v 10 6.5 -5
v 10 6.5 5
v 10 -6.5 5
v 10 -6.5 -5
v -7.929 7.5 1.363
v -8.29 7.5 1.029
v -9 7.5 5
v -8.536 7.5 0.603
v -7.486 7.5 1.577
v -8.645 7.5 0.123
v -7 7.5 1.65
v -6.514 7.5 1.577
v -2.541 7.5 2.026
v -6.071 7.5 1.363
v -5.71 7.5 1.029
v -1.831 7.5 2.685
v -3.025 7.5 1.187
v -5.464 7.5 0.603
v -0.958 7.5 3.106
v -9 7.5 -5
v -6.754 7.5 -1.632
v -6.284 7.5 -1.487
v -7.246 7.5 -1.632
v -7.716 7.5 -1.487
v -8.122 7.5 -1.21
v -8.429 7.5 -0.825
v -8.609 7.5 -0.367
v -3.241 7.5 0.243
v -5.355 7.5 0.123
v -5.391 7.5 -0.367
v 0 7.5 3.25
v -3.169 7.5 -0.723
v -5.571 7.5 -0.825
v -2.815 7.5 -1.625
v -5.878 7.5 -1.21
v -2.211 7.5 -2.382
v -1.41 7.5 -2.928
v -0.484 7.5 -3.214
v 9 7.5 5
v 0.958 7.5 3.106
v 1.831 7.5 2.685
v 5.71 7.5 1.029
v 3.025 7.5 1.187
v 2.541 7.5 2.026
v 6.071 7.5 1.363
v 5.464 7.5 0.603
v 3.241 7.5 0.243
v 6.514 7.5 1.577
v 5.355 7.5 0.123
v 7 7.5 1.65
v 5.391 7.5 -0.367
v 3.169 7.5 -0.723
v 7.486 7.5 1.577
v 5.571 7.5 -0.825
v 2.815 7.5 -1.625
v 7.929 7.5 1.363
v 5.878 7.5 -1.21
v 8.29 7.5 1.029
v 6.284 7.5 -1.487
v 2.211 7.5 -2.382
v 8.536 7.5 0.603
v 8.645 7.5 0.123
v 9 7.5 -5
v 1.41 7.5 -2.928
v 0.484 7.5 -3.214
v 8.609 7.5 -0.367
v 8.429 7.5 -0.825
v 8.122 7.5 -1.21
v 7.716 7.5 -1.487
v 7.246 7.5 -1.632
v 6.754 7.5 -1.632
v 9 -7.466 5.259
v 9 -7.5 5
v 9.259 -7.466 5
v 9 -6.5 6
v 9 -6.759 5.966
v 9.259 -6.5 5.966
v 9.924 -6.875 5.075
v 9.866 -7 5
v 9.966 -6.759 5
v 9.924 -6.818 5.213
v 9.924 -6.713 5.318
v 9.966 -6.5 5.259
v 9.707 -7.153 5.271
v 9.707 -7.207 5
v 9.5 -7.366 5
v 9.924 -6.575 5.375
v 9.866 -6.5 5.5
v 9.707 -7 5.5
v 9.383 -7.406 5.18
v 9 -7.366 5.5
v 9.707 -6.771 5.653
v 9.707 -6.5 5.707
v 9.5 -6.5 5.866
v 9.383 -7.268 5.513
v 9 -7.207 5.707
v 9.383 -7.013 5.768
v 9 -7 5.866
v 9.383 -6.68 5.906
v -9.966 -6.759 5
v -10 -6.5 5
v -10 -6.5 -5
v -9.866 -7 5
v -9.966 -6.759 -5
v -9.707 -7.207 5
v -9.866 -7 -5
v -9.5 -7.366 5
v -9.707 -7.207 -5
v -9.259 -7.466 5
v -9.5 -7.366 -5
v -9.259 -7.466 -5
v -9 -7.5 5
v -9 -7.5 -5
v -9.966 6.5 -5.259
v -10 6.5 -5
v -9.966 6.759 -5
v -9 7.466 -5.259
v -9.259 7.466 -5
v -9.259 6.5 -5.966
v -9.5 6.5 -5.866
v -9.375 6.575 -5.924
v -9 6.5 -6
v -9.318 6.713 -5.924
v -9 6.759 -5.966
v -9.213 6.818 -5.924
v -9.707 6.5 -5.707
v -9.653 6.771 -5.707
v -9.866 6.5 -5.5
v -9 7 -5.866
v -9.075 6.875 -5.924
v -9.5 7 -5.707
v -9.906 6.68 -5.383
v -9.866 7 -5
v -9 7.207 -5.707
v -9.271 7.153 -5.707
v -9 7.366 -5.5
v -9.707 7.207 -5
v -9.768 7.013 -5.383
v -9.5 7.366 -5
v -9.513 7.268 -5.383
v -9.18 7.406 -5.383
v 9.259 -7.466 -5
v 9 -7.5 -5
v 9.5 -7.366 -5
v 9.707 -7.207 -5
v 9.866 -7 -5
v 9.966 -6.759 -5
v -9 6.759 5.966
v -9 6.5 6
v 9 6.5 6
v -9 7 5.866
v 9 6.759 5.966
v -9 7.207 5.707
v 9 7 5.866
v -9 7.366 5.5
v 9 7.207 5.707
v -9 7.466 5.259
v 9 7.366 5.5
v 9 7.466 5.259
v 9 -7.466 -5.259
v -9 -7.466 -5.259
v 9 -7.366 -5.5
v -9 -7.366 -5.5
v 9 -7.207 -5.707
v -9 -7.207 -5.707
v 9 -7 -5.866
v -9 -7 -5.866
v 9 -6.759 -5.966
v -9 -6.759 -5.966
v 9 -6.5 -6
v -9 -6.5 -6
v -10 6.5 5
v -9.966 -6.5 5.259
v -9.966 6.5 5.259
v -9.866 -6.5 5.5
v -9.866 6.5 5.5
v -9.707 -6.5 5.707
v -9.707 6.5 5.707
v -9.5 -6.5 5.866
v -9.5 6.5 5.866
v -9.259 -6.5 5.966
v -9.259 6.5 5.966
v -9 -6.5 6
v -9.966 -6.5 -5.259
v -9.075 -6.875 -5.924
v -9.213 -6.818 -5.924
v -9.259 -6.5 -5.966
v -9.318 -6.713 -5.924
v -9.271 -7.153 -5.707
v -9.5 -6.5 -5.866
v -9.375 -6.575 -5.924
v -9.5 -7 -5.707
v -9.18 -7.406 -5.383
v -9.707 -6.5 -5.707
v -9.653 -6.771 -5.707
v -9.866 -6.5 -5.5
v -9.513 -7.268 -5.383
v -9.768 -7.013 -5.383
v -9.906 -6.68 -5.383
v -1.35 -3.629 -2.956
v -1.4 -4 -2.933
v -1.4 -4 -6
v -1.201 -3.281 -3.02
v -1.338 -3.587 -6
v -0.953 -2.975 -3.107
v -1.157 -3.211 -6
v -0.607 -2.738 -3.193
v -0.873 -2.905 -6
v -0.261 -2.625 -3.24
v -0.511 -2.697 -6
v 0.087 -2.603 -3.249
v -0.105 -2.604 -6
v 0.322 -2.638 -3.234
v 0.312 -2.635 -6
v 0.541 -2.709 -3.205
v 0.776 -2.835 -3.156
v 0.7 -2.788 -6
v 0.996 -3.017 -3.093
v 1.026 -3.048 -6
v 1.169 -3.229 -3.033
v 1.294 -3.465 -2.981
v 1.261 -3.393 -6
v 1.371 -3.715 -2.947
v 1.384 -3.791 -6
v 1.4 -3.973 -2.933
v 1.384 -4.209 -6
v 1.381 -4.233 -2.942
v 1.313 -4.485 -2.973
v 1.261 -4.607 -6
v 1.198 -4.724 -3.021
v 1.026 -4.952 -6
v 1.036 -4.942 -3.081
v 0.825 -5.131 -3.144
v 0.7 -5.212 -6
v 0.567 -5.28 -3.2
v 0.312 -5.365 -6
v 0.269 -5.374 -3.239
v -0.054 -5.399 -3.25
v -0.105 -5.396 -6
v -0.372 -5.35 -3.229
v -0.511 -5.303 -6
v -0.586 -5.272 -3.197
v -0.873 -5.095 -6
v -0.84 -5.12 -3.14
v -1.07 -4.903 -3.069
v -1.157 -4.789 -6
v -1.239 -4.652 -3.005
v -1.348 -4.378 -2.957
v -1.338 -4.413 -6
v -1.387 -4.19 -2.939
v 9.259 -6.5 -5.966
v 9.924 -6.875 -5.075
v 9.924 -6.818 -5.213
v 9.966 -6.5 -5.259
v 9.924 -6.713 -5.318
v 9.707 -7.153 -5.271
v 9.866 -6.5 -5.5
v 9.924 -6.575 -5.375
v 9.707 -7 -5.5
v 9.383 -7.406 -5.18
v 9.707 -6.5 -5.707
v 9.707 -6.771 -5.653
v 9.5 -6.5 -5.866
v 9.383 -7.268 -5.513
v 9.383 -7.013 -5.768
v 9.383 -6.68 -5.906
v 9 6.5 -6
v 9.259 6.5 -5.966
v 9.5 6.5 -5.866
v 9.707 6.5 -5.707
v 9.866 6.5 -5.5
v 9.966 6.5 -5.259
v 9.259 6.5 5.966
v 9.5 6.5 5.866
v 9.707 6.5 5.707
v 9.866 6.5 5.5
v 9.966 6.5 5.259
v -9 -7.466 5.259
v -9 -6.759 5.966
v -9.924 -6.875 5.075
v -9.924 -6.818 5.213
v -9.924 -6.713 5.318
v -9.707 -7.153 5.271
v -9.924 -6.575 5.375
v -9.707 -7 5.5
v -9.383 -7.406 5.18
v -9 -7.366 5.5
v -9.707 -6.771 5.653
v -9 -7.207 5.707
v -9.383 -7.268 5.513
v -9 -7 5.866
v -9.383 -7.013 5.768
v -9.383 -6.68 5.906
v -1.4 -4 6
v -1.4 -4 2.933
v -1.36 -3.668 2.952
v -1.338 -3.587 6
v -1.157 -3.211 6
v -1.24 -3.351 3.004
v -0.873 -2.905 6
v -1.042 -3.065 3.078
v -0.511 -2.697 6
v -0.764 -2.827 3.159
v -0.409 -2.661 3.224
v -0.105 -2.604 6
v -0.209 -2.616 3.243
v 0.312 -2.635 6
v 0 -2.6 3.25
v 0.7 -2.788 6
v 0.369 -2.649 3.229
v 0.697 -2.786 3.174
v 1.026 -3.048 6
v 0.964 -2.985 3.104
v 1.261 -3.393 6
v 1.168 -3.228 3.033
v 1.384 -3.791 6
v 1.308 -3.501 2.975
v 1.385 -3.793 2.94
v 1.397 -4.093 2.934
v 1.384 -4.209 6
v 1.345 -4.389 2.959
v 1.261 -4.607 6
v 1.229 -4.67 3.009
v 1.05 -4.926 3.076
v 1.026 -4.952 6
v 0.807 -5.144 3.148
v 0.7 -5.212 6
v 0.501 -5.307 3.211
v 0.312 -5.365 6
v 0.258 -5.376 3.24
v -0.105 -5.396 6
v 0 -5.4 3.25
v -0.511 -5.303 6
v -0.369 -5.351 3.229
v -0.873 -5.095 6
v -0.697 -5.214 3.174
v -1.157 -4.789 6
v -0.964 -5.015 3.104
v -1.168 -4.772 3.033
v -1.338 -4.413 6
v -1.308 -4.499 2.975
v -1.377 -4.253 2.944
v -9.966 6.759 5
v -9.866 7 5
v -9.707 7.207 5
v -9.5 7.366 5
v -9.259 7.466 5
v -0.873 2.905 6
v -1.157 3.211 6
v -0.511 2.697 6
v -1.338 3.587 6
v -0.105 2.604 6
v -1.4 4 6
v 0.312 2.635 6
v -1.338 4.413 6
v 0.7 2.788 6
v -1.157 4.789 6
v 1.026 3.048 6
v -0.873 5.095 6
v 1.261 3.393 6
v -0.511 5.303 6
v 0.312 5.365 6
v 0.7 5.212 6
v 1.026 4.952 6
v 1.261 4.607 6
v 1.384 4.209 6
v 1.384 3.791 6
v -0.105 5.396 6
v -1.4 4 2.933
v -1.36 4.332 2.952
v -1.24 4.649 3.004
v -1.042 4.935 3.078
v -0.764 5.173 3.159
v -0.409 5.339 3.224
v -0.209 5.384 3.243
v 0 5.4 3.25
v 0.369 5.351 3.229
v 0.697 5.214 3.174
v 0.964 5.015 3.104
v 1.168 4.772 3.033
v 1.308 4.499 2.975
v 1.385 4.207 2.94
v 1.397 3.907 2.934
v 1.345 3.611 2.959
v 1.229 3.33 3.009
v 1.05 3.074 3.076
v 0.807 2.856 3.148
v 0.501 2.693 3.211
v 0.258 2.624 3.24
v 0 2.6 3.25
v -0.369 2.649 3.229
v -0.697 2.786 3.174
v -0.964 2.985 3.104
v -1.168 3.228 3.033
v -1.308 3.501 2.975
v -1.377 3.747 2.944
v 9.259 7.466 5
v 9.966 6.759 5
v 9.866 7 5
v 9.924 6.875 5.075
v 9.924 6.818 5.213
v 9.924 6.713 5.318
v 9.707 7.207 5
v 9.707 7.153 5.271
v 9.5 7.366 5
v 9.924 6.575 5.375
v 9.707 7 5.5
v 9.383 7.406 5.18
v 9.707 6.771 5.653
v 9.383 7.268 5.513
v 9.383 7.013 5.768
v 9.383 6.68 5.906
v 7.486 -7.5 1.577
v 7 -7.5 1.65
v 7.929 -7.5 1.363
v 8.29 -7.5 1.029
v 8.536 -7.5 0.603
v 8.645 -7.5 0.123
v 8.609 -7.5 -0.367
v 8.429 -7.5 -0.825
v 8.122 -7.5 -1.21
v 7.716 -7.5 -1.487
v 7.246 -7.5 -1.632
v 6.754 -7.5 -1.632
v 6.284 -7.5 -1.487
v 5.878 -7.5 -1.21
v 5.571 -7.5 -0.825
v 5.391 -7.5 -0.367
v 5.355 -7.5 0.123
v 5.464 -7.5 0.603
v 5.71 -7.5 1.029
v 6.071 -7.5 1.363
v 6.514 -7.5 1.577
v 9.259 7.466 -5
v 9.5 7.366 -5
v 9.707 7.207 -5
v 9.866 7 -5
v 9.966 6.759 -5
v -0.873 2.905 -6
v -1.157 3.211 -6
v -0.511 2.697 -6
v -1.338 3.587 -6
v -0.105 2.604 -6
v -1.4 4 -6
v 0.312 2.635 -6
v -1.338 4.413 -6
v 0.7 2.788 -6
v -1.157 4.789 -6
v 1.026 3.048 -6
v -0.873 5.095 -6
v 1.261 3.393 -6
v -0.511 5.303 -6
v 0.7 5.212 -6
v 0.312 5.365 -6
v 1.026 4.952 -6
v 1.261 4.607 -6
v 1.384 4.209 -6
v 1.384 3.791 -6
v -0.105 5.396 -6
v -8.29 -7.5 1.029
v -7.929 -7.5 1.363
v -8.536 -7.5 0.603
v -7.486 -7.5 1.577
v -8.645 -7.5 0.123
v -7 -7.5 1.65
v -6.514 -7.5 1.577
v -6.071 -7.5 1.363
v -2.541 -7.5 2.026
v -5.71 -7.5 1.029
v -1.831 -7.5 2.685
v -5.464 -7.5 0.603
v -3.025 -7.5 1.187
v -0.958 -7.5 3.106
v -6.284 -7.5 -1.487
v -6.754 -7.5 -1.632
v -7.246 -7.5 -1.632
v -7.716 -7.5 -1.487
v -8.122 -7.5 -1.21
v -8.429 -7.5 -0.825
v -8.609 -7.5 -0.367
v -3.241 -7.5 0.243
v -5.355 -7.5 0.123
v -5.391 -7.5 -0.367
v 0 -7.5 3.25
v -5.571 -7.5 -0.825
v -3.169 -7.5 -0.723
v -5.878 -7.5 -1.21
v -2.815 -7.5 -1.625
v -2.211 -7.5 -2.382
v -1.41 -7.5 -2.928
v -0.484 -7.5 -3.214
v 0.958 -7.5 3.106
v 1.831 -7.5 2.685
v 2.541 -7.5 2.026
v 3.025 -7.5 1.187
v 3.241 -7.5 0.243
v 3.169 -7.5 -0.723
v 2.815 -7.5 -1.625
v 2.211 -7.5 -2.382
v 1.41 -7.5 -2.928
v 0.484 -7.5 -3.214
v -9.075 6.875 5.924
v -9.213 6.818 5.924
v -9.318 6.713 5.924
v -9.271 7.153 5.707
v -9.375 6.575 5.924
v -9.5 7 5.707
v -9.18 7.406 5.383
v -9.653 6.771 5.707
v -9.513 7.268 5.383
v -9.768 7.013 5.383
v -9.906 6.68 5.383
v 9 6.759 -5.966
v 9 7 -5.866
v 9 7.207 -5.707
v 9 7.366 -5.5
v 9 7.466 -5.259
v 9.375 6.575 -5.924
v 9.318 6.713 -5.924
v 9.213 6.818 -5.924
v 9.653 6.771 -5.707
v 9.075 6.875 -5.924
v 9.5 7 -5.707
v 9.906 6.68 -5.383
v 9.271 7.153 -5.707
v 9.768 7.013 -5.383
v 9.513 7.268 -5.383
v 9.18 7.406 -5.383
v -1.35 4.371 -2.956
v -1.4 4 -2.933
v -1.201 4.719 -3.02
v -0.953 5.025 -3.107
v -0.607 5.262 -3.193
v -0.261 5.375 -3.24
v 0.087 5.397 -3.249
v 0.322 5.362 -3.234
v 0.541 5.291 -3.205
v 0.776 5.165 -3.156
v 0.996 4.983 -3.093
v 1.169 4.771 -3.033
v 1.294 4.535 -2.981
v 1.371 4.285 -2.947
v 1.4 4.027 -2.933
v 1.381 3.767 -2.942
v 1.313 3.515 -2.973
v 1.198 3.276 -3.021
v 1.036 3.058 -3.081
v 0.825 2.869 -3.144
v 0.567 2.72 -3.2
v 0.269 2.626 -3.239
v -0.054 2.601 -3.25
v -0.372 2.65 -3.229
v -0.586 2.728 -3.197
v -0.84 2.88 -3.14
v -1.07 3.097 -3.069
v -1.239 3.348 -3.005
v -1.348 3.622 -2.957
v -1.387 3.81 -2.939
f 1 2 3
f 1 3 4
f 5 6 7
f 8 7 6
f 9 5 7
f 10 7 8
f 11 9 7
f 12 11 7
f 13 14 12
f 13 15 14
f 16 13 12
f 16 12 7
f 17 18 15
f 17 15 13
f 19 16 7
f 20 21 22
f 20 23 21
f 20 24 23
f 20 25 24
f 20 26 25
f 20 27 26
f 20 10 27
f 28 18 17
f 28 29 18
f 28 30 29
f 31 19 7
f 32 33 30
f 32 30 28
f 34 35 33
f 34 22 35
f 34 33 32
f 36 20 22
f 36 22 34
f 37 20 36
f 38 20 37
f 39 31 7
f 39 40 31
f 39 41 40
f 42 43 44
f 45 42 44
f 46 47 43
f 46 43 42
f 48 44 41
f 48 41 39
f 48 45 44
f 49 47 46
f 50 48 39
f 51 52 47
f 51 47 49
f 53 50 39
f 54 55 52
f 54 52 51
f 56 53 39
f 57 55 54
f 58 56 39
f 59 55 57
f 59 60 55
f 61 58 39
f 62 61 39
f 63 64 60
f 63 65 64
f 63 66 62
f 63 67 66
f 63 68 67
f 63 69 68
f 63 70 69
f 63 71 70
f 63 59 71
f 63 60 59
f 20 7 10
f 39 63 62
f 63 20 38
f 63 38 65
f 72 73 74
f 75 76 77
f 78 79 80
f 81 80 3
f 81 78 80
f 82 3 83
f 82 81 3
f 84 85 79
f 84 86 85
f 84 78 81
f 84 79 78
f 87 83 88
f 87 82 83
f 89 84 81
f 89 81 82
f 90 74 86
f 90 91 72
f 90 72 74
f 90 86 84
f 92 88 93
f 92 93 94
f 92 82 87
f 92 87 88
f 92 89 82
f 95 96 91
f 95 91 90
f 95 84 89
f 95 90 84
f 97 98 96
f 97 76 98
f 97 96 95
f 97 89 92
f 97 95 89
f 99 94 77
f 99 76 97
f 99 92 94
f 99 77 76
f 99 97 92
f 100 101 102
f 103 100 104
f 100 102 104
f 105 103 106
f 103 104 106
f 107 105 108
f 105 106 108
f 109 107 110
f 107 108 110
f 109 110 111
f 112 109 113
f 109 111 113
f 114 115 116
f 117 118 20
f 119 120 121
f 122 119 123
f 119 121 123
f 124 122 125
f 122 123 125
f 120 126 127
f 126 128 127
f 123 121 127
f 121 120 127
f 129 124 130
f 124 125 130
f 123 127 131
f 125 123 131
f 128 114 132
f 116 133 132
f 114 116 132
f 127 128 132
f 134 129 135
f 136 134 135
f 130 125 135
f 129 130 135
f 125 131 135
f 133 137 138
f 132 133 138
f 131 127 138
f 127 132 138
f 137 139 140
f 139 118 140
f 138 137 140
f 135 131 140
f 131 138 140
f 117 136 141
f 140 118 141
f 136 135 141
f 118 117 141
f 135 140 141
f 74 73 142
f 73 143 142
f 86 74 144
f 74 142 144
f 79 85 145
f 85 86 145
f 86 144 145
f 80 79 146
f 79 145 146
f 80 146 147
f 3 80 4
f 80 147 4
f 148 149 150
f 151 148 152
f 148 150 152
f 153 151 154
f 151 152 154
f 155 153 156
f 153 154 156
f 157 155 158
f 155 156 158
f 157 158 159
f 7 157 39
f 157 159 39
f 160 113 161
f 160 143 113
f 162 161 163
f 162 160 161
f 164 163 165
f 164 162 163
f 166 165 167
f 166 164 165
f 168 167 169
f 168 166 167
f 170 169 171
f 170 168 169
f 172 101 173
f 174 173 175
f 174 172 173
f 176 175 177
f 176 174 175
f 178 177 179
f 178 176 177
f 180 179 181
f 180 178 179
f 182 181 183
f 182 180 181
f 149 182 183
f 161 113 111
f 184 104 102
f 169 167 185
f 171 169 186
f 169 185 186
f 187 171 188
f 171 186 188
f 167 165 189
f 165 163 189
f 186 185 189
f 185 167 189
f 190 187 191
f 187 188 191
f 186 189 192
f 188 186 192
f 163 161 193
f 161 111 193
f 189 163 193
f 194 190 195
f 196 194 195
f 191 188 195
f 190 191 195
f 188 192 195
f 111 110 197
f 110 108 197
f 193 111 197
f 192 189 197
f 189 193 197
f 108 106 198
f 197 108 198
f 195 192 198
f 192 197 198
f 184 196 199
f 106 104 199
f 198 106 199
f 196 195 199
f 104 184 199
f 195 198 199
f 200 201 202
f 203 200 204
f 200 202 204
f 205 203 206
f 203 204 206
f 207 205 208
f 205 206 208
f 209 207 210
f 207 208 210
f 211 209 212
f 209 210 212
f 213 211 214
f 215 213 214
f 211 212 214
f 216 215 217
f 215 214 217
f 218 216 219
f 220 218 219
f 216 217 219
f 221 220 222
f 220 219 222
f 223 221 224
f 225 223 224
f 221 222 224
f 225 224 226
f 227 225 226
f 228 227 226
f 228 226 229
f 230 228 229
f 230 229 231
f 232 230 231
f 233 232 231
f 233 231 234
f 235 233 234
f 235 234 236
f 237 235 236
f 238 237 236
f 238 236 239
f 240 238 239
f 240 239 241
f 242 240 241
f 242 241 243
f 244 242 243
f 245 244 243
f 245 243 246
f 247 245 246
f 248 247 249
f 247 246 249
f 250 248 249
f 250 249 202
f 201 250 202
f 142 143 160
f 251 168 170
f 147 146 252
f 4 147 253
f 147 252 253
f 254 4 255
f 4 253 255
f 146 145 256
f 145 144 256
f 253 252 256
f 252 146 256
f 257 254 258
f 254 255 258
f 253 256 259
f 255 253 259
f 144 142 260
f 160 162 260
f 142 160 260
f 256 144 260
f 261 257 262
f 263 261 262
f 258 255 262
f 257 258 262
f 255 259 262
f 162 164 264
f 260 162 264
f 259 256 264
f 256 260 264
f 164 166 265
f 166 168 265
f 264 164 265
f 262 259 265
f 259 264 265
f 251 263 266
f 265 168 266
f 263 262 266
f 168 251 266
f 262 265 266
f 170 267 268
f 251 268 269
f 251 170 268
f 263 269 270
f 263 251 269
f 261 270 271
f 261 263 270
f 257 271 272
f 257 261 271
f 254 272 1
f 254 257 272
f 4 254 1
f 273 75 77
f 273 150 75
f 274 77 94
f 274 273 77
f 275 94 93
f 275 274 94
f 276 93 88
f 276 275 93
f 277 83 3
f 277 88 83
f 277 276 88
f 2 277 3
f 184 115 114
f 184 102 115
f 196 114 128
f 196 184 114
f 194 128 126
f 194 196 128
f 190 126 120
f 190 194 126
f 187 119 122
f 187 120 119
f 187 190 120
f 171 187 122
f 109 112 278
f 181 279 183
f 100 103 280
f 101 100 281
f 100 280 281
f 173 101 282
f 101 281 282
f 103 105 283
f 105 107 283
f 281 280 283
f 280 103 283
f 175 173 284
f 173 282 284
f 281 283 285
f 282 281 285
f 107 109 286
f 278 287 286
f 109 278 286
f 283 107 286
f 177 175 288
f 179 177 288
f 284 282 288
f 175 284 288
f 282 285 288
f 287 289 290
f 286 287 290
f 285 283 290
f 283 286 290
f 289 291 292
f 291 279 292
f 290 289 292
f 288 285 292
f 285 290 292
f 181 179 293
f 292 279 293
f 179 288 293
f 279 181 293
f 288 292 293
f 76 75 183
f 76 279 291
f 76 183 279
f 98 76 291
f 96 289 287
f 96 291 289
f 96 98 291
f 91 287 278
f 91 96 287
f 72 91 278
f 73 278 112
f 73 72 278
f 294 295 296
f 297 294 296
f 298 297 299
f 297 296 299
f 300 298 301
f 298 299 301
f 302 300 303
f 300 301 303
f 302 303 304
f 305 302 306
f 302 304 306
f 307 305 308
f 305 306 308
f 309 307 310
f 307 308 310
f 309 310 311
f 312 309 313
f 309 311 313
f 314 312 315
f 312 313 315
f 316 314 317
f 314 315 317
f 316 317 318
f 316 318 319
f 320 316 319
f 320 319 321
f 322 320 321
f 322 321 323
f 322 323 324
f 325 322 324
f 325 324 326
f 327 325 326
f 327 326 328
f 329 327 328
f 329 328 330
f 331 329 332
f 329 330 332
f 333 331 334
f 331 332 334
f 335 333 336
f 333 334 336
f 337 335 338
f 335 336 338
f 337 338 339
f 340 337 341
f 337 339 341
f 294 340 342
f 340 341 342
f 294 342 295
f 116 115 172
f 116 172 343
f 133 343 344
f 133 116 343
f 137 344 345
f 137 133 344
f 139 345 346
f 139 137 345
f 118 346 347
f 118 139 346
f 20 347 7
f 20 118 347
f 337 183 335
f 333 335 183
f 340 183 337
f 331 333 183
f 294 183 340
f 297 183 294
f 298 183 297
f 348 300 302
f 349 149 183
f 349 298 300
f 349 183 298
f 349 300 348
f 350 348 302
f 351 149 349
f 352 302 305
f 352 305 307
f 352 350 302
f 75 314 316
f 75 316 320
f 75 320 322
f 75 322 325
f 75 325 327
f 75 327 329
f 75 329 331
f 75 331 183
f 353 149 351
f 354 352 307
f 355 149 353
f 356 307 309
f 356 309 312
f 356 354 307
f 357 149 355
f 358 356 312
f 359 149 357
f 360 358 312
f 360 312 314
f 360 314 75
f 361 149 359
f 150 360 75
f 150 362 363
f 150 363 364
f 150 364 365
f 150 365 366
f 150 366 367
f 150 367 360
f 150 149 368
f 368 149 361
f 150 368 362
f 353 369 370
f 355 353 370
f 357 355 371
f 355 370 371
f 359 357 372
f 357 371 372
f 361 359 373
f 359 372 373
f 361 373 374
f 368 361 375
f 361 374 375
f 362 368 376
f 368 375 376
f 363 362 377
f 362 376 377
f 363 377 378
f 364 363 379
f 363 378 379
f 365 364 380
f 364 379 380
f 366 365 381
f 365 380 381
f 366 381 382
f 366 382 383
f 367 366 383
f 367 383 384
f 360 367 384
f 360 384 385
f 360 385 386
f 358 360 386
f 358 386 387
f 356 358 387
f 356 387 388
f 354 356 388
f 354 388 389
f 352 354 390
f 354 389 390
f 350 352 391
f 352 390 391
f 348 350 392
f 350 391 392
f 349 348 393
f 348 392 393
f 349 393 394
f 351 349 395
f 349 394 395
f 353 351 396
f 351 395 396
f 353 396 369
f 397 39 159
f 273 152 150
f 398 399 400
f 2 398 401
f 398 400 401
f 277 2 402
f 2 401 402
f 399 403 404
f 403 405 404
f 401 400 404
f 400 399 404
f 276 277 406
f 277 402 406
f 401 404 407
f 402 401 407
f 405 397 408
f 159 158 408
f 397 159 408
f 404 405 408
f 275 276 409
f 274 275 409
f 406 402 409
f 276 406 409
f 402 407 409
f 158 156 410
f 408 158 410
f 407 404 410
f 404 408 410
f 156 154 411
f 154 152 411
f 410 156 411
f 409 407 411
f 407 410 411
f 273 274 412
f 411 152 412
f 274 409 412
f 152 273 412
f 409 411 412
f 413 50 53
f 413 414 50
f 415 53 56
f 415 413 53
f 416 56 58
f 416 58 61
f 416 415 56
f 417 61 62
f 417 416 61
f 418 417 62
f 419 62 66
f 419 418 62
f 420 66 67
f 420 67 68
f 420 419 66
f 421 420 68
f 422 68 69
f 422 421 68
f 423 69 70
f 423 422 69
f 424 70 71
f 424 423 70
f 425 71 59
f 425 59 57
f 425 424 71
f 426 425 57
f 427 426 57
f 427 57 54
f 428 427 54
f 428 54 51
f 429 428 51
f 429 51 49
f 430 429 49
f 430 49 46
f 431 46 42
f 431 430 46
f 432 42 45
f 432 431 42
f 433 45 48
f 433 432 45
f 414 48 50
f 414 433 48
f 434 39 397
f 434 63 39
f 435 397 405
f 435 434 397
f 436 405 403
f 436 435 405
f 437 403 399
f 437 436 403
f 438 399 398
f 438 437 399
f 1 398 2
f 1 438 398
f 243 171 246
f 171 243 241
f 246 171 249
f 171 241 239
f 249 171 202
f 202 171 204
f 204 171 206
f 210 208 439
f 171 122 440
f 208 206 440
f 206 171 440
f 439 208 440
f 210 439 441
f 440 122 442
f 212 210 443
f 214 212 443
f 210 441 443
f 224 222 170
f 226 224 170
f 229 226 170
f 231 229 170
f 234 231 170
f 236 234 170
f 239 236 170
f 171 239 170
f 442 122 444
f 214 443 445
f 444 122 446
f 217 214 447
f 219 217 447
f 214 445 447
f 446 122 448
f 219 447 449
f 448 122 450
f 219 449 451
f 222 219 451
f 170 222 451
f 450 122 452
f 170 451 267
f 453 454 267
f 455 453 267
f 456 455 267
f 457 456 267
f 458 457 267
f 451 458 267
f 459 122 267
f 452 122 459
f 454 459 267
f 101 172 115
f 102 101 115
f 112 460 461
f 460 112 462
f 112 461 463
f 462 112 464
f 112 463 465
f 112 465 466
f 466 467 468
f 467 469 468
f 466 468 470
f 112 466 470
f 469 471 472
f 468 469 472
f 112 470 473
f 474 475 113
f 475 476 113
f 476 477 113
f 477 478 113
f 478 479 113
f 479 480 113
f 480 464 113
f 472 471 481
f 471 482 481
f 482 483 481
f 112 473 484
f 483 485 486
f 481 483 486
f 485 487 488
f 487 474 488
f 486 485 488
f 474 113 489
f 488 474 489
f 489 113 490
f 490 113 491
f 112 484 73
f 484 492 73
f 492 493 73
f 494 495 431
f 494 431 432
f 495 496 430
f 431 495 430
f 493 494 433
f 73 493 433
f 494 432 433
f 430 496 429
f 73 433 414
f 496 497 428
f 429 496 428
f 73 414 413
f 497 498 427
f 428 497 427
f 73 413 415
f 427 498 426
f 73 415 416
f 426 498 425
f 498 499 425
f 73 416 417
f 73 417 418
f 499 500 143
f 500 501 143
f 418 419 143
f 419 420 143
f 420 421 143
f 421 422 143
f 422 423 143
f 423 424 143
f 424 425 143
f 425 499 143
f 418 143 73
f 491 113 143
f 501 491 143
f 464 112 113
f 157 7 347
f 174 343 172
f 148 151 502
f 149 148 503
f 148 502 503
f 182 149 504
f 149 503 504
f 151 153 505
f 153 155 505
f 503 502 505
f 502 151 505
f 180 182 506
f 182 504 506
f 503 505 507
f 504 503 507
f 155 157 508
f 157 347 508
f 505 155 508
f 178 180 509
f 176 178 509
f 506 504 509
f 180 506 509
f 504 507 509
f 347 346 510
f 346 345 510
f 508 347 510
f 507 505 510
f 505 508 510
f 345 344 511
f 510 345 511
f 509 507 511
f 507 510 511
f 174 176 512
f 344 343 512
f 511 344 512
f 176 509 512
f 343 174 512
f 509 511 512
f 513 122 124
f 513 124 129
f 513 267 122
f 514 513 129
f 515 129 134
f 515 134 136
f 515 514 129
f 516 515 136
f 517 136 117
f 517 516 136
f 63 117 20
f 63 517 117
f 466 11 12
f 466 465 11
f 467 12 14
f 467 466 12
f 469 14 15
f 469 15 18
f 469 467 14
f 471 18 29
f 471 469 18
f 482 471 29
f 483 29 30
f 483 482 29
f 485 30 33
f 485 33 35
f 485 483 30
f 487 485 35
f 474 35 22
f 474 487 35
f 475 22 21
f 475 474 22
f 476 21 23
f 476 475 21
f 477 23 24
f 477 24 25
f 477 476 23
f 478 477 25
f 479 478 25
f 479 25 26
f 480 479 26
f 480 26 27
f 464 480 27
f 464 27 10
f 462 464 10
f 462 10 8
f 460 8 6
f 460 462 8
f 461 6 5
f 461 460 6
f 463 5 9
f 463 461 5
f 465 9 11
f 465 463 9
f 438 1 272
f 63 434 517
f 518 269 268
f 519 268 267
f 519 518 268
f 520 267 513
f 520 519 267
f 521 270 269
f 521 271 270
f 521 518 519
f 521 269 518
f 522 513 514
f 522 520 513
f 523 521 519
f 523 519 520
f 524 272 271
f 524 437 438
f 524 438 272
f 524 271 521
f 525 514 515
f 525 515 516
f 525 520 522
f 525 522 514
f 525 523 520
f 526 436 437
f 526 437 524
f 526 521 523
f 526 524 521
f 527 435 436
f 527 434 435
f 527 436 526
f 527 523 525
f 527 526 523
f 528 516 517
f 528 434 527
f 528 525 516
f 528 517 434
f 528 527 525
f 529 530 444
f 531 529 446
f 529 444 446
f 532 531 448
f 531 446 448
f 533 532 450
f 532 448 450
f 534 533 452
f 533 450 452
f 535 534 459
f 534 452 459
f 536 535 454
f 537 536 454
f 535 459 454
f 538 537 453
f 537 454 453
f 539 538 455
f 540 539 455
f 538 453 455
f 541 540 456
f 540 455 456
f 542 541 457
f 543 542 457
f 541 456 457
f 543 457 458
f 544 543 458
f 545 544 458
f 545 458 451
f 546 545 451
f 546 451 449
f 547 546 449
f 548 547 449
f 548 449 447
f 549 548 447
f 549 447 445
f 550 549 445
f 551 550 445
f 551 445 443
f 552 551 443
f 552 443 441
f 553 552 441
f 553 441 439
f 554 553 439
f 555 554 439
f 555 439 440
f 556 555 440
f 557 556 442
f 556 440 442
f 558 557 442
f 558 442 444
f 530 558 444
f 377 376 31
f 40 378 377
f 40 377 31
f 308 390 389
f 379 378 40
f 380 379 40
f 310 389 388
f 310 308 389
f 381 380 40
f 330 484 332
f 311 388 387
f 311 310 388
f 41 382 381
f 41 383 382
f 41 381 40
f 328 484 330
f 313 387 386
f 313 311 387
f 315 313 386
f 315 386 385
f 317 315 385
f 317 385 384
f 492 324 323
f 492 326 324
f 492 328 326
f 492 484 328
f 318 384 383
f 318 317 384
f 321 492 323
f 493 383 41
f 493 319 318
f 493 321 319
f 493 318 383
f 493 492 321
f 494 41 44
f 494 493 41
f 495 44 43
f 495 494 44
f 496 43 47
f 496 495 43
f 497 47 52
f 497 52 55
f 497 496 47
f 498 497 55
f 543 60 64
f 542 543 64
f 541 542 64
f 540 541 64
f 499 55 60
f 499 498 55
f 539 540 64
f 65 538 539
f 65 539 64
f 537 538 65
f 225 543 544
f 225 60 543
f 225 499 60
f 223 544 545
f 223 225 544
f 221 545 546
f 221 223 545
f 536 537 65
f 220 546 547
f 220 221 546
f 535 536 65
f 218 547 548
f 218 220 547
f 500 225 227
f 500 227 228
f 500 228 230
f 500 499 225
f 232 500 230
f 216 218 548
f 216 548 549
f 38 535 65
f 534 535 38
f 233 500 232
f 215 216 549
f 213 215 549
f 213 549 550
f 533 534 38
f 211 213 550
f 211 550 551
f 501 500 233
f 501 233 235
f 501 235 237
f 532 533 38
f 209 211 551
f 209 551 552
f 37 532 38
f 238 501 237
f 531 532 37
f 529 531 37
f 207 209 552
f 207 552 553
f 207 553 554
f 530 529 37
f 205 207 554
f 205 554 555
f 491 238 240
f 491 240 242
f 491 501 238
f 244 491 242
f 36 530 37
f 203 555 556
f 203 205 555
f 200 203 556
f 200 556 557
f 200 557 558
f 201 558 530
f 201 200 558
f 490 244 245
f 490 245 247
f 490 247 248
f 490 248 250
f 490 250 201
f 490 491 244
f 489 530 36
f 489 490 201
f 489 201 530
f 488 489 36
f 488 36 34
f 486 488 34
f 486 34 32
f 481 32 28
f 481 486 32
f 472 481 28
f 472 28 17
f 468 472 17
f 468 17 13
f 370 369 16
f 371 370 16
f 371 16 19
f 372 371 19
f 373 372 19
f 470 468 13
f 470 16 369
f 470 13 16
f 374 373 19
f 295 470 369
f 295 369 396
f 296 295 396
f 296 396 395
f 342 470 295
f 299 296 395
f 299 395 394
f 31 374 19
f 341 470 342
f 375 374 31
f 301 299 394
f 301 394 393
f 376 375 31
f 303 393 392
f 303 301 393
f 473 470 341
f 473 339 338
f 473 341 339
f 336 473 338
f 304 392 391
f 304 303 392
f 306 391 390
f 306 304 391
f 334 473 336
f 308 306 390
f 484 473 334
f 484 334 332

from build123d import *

# Parameters (mm, degrees)
SKETCH_1_W          = 20
SKETCH_1_H          = 12
SKETCH_1_R          = 3.25
SKETCH_1_R_2        = 1.65
EXTRUDE_1_DEPTH     = 7.5
SKETCH_3_R          = 1.4
CUT_EXTRUDE_1_DEPTH = 15
FILLET_1_R          = 1


with BuildPart() as part:
    # 草图1 → 凸台-拉伸1 (new, symmetric)
    with BuildSketch(Plane(origin=(0, 0, 0), x_dir=(1, 0, 0), z_dir=(0, 1, 0))):
        Rectangle(SKETCH_1_W, SKETCH_1_H)
        with Locations(Location((0, 0, 0), (0, 0, 270))):
            Circle(SKETCH_1_R, mode=Mode.SUBTRACT)
        with Locations(Location((-7, 0, 0), (0, 0, 270))):
            Circle(SKETCH_1_R_2, mode=Mode.SUBTRACT)
        with Locations(Location((7, 0, 0), (0, 0, 270))):
            Circle(SKETCH_1_R_2, mode=Mode.SUBTRACT)
    extrude(amount=EXTRUDE_1_DEPTH, both=True)

    # 草图3 → 切除-拉伸1 (cut)
    with BuildSketch(Plane(origin=(0, 0, -6), x_dir=(-1, 0, 0), z_dir=(0, 0, -1))):
        with Locations((0, 4)):
            Circle(SKETCH_3_R)
        with Locations((0, -4)):
            Circle(SKETCH_3_R)
    extrude(amount=-CUT_EXTRUDE_1_DEPTH, mode=Mode.SUBTRACT)

    # 圆角1
    fillet_1_edges = [part.edges().sort_by_distance(p)[0] for p in [
        (-10, 7.5, 0),
        (0, 7.5, 6),
        (10, 7.5, 0),
        (0, -7.5, 6),
        (-10, -7.5, 0),
        (0, -7.5, -6),
        (10, -7.5, 0),
        (10, 0, 6),
        (-10, 0, 6),
        (-10, 0, -6),
        (10, 0, -6),
        (0, 7.5, -6),
    ]]
    fillet(fillet_1_edges, radius=FILLET_1_R)


solid = part.part
